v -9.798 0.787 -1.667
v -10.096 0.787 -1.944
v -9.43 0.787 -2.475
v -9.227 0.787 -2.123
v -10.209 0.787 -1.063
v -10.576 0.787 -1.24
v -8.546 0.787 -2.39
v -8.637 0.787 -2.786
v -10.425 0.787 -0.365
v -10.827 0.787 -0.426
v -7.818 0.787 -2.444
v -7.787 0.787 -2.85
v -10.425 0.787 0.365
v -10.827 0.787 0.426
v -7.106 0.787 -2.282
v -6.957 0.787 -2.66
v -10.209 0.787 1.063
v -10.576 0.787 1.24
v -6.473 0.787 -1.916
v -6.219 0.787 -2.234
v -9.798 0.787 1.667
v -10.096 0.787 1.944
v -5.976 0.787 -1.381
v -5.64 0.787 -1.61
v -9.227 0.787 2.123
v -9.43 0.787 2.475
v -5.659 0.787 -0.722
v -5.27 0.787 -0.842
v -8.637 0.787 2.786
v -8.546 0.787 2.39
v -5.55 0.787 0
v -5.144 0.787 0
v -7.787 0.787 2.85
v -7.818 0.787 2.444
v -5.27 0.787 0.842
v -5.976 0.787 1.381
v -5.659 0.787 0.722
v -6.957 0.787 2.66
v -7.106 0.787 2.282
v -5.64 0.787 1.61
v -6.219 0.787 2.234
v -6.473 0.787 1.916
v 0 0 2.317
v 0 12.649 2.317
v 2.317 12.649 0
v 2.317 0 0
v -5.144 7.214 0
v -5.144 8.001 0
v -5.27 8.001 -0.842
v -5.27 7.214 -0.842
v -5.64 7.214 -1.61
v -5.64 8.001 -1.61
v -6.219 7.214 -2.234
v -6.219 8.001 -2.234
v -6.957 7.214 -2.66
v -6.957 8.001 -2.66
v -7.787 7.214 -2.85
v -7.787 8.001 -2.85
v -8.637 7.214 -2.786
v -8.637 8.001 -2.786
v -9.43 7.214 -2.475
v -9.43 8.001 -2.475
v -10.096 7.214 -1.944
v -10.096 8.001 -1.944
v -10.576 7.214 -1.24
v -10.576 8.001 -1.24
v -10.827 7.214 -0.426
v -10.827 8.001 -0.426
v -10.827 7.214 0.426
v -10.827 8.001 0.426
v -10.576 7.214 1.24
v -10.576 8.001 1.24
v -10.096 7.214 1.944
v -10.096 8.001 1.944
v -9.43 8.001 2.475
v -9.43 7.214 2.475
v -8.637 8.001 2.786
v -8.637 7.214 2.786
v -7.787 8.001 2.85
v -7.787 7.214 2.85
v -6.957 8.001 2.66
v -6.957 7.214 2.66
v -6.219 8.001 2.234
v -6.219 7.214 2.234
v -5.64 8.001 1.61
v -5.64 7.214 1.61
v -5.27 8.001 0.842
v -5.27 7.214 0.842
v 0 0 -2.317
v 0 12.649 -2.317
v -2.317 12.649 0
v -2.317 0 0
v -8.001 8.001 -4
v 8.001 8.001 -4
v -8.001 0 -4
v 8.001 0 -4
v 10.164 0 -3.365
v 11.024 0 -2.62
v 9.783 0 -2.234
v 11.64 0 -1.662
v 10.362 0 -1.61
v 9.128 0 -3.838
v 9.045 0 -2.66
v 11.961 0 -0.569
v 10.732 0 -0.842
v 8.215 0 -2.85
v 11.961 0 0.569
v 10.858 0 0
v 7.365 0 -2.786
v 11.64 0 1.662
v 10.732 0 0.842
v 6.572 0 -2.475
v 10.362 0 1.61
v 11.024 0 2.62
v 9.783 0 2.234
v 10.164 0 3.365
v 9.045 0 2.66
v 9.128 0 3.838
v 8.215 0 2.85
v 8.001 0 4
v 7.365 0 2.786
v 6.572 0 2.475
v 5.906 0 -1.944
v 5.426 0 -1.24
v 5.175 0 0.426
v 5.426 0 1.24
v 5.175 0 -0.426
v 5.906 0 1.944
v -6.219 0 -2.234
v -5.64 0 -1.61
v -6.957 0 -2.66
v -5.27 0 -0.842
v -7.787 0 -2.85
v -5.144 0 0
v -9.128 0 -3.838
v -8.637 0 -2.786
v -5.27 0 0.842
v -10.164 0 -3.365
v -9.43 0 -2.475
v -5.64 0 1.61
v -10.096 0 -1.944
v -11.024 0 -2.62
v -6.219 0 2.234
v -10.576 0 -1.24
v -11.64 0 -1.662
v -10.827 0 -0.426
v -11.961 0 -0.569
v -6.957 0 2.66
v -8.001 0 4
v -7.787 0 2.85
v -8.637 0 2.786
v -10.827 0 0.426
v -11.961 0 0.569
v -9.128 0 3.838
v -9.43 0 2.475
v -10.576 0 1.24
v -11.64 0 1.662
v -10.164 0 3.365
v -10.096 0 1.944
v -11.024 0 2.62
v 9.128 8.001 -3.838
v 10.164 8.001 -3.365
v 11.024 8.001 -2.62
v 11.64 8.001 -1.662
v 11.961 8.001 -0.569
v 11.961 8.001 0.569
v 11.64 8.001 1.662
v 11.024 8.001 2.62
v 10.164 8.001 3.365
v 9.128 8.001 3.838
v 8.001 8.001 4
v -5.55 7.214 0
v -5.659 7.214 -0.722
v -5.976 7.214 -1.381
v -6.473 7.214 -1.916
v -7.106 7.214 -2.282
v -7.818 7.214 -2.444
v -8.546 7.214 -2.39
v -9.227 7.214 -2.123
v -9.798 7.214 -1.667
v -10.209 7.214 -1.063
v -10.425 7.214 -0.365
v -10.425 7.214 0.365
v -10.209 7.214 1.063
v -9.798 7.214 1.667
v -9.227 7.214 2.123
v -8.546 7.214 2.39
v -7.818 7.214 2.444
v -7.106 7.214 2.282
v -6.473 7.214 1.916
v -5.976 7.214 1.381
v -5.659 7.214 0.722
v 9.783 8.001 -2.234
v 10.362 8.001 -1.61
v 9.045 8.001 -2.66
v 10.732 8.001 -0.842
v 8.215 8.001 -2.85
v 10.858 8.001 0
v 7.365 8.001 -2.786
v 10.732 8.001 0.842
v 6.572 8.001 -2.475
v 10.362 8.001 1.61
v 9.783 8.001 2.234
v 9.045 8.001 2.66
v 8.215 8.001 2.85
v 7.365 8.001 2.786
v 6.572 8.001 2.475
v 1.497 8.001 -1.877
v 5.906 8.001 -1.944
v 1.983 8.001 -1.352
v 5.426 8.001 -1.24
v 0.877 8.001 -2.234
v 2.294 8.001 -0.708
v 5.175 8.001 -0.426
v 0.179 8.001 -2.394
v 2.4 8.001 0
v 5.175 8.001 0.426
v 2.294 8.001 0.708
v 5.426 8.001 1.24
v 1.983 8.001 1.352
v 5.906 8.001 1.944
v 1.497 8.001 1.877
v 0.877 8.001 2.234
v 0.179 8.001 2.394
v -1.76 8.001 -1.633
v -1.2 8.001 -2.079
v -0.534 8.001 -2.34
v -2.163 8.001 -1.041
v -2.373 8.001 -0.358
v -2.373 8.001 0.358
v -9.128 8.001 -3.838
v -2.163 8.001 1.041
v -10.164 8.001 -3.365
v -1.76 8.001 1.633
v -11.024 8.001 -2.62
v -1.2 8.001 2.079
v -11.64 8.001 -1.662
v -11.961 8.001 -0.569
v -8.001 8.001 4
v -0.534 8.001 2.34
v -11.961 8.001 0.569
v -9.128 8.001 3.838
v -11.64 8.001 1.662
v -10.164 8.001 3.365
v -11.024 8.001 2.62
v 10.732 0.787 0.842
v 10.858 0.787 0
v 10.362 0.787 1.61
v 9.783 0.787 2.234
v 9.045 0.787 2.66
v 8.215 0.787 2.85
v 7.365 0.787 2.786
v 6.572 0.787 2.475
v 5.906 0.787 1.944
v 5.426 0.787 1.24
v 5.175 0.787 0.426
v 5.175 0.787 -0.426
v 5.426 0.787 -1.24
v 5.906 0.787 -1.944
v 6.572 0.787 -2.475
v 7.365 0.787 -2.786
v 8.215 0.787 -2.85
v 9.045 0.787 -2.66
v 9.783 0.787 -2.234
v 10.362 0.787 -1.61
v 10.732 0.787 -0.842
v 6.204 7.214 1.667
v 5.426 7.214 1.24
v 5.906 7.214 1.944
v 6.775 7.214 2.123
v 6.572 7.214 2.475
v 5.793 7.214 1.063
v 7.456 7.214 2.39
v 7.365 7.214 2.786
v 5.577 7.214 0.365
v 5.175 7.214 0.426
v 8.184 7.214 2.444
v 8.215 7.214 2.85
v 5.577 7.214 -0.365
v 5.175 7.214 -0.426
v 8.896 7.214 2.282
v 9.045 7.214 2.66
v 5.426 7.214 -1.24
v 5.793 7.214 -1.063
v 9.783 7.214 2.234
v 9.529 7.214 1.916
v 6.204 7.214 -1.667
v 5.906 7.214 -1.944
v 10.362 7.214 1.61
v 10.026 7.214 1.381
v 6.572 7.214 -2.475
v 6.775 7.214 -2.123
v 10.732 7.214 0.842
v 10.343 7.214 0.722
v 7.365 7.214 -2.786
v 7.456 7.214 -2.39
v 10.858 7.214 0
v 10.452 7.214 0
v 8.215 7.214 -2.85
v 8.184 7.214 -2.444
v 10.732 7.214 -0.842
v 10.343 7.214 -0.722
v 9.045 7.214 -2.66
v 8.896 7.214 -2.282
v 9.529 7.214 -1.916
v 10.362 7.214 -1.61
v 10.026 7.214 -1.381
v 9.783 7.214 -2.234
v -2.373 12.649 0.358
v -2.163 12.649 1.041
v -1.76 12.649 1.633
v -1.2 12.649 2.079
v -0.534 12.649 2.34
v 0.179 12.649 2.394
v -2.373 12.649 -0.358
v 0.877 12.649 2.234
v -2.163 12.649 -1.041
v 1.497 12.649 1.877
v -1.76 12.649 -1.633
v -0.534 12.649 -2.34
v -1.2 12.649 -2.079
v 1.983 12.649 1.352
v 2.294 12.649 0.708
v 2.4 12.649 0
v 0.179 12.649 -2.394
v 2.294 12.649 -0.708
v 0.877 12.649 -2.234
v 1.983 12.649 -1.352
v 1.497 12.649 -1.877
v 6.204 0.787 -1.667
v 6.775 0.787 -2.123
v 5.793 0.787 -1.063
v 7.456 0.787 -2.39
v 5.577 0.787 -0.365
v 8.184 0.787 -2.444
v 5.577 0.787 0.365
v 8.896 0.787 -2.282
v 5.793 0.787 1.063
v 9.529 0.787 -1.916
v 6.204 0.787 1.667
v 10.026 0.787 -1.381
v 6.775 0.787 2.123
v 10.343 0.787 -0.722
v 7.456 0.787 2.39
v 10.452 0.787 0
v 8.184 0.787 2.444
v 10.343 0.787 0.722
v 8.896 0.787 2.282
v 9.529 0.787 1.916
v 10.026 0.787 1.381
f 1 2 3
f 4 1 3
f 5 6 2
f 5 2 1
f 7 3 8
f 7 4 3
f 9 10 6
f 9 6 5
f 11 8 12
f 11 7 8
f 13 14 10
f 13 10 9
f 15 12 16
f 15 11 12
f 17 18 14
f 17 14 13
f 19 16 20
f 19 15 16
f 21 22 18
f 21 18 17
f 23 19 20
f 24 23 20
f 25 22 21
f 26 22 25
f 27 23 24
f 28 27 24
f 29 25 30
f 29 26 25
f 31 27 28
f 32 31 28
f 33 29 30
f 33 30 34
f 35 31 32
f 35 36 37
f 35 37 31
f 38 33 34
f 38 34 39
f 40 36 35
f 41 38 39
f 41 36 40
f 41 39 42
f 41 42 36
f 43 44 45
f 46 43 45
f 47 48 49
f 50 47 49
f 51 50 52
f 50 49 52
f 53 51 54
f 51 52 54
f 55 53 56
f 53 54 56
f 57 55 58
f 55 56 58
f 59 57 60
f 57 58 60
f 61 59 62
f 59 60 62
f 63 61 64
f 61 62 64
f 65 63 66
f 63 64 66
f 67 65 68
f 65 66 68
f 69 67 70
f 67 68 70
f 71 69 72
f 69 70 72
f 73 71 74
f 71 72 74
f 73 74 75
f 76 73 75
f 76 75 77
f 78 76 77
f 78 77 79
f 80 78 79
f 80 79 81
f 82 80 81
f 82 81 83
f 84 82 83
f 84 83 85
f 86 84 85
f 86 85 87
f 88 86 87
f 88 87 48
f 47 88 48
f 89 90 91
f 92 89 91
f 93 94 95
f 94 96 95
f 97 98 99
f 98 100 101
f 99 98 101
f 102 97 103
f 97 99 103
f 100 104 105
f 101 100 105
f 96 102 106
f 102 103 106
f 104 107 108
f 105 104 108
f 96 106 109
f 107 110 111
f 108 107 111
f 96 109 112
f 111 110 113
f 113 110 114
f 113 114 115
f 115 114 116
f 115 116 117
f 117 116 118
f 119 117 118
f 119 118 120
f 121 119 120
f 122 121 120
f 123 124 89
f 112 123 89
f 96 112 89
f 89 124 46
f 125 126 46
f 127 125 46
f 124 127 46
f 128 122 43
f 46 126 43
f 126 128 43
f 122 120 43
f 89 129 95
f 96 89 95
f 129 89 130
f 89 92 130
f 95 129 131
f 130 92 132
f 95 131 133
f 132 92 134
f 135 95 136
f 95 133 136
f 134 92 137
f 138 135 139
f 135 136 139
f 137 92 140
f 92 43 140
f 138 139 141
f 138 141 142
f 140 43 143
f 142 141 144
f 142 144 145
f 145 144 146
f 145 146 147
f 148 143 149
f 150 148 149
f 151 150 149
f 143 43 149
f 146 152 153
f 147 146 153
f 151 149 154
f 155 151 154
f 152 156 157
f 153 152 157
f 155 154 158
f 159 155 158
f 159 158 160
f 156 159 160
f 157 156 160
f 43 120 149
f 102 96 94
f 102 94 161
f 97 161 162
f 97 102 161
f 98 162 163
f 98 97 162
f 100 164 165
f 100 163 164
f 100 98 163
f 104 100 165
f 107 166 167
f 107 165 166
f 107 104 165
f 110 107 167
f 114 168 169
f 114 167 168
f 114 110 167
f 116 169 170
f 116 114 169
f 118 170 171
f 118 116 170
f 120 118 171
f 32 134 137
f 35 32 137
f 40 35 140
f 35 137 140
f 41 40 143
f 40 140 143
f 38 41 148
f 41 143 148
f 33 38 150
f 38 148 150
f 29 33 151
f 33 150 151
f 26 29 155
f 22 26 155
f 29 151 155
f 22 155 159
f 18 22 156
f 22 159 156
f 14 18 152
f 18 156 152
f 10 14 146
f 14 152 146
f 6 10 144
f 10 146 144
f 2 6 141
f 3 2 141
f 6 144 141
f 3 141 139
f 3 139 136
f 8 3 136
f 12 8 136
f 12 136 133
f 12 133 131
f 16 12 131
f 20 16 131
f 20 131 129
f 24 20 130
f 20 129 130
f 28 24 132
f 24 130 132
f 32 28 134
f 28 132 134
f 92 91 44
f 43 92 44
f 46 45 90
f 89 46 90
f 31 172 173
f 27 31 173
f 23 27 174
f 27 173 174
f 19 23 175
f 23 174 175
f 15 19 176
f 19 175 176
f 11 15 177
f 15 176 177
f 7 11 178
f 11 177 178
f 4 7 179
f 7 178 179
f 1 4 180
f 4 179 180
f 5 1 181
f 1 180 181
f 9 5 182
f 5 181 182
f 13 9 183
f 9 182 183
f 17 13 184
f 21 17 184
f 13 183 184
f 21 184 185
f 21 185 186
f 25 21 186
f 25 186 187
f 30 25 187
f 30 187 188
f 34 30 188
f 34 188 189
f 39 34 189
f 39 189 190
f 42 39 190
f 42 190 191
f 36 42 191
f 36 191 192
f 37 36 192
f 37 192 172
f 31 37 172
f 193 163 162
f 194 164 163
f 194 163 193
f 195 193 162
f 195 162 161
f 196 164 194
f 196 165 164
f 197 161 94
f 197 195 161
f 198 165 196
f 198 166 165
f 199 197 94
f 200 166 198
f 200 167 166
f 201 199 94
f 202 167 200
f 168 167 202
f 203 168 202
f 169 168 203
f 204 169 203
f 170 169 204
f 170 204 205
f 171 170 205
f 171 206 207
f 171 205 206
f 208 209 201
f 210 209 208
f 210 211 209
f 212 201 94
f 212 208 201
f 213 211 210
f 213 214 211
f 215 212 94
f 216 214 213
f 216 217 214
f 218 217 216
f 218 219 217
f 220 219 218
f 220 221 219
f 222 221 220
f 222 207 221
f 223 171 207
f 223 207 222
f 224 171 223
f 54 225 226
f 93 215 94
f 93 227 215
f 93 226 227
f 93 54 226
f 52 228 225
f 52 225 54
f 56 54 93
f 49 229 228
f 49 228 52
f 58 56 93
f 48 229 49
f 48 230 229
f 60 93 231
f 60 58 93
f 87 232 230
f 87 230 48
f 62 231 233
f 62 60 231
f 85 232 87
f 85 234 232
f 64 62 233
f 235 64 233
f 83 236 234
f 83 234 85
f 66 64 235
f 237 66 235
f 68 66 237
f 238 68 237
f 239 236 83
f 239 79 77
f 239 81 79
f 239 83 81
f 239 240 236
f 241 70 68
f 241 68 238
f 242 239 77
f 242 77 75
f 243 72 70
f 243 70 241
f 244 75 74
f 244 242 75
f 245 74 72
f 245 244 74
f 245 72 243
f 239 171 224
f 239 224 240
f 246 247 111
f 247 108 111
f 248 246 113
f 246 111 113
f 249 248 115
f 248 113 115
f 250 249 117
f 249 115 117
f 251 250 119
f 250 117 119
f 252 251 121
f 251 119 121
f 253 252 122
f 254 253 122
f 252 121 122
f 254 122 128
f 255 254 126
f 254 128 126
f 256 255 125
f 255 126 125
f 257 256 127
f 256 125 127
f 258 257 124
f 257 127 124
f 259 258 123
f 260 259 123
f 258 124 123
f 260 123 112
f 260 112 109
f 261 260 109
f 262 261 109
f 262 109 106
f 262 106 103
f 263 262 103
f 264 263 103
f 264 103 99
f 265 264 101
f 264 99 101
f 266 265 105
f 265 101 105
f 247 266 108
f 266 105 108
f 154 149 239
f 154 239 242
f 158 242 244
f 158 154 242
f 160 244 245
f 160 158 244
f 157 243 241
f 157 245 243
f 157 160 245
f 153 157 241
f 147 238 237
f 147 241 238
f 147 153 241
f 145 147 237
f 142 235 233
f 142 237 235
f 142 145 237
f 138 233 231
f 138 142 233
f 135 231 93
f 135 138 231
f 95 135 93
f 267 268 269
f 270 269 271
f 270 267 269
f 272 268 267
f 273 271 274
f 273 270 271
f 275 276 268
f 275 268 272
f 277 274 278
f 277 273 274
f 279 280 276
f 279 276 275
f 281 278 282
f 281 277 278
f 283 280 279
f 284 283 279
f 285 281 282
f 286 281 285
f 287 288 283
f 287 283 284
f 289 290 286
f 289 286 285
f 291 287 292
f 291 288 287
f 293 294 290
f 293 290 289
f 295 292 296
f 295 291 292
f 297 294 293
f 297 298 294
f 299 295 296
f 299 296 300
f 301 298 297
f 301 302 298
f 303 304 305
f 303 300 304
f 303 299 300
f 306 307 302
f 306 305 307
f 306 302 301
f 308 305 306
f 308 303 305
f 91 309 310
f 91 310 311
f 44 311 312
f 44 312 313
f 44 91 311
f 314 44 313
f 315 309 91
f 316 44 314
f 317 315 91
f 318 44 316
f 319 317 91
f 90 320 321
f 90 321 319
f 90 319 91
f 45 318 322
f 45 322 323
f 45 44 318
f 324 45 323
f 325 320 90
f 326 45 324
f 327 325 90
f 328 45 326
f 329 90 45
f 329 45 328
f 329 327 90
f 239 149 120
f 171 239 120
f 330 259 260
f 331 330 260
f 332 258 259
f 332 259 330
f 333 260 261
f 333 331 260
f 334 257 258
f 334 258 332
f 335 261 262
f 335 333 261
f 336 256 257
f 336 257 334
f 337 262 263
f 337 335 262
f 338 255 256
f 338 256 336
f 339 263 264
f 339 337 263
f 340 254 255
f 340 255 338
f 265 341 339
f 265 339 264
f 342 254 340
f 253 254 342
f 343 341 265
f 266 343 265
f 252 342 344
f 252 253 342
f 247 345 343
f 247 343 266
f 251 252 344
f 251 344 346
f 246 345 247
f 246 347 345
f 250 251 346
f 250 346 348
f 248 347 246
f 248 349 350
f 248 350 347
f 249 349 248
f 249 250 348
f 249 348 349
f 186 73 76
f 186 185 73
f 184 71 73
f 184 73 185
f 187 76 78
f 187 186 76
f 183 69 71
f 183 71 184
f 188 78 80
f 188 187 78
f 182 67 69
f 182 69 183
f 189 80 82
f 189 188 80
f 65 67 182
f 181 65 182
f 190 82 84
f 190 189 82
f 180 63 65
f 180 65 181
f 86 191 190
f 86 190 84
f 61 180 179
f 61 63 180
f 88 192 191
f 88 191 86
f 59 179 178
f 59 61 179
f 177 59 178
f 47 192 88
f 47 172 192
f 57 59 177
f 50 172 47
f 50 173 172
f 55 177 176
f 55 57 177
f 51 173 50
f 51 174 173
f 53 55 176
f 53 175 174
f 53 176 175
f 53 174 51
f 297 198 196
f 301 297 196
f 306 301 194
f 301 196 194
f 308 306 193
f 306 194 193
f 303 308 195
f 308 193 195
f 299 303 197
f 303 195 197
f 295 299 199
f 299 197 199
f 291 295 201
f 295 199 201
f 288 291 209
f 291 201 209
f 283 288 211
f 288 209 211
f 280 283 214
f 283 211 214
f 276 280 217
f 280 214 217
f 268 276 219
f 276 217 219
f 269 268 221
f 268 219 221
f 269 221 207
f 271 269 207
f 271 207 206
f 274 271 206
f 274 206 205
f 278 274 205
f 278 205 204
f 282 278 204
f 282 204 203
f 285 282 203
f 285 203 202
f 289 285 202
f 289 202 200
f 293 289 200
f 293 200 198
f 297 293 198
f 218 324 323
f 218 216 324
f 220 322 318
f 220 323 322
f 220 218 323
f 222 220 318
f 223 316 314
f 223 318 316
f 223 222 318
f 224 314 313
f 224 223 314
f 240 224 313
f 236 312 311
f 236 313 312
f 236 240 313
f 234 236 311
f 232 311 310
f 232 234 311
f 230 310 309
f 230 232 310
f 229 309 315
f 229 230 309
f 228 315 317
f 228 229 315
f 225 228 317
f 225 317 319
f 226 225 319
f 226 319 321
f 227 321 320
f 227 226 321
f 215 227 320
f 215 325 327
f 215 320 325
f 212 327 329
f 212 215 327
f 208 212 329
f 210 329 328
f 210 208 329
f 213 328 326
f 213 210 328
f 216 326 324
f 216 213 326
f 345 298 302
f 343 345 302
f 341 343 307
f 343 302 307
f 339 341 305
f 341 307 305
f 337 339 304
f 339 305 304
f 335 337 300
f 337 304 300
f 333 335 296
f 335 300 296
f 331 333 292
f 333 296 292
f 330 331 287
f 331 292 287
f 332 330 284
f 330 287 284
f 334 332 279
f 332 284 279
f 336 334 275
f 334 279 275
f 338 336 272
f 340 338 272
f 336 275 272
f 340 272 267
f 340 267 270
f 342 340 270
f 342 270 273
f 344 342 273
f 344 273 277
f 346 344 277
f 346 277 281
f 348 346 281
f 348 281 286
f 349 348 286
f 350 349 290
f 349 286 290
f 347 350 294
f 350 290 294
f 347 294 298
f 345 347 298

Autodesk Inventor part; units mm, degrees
ref_plane "YZ Plane" through (0, 0, 0) normal (1, 0, 0) x (0, 1, 0)
ref_plane "XZ Plane" through (0, 0, 0) normal (0, 1, 0) x (-1, 0, 0)
ref_plane "XY Plane" through (0, 0, 0) normal (0, 0, 1) x (1, 0, 0)
sketch "Sketch1" plane through (0, 0, 0) normal (0, 1, 0) x (-1, 0, 0)
  line L0 (-8.001, 0) -> (8.001, 0) construction
  line L1 (-8.001, -4.0005) -> (8.001, -4.0005)
  line L2 (8.001, 4.0005) -> (-8.001, 4.0005)
  arc A0 (-8.001, 4.0005) -> (-8.001, -4.0005) centre (-8.001, 0) ccw
  arc A1 (8.001, -4.0005) -> (8.001, 4.0005) centre (8.001, 0) ccw
  line L3 (-2.3169, 0) -> (0, 2.3169)
  line L4 (0, 2.3169) -> (2.3169, 0)
  line L5 (2.3169, 0) -> (0, -2.3169)
  line L6 (0, -2.3169) -> (-2.3169, 0)
  line L7 (-2.3169, 0) -> (2.3169, 0) construction
  line L8 (0, 2.3169) -> (0, -2.3169) construction
  point P0 (0, 0)
  dimension "d0" = 8.001
  dimension "d1" = 8.001
  dimension "d2" = 3.2766
  dimension "d3" = 3.2766
extrude "Extrusion1" add sketch "Sketch1" along normal blind 8.001
sketch "Sketch2" plane through (0, 8.001, 0) normal (0, 1, 0) x (1, 0, 0)
  circle A0 centre (-8.001, 0) radius 2.8575
  point P0 (0, 0)
  dimension "d6" = 8.001
  dimension "d7" = 5.715
extrude "Extrusion2" cut sketch "Sketch2" against normal blind 0.7874
sketch "Sketch3" plane through (0, 8.001, 0) normal (0, 1, 0) x (1, 0, 0)
  circle A0 centre (8.001, 0) radius 2.8575
  point P0 (0, 0)
  dimension "d10" = 8.001
  dimension "d11" = 5.715
extrude "Extrusion3" cut sketch "Sketch3" against normal blind 0.7874
sketch "Sketch4" plane through (0, 0, 0) normal (0, -1, 0) x (1, 0, 0)
  circle A0 centre (8.001, 0) radius 2.8575 projected
  circle A1 centre (8.001, 0) radius 2.8575
  point P0 (0, 0)
extrude "Extrusion4" cut sketch "Sketch4" against normal blind 0.7874
sketch "Sketch5" plane through (0, 0, 0) normal (0, -1, 0) x (1, 0, 0)
  circle A0 centre (-8.001, 0) radius 2.8575 projected
  circle A1 centre (-8.001, 0) radius 2.8575
  point P0 (0, 0)
extrude "Extrusion5" cut sketch "Sketch5" against normal blind 0.7874
sketch "Sketch6" plane through (-8.001, 7.2136, 0) normal (0, 1, 0) x (1, 0, 0)
  circle A0 centre (0, 0) radius 2.4511
  point P0 (8.001, 0)
  dimension "d18" = 4.9022
extrude "Extrusion6" cut sketch "Sketch6" against normal through all
sketch "Sketch7" plane through (8.001, 7.2136, 0) normal (0, 1, 0) x (1, 0, 0)
  circle A0 centre (0, 0) radius 2.4511
  point P0 (-8.001, 0)
  dimension "d21" = 4.9022
extrude "Extrusion7" cut sketch "Sketch7" against normal through all
sketch "Sketch8" plane through (0, 8.001, 0) normal (0, 1, 0) x (1, 0, 0)
  circle A0 centre (0, 0) radius 2.4003
  dimension "d24" = 4.8006
extrude "Extrusion8" add sketch "Sketch8" along normal blind 4.6482
sketch "Sketch9" plane through (0, 12.6492, 0) normal (0, 1, 0) x (1, 0, 0)
  line L0 (2.3169, 0) -> (0, 2.3169)
  line L1 (0, 2.3169) -> (-2.3169, 0)
  line L2 (-2.3169, 0) -> (0, -2.3169)
  line L3 (0, -2.3169) -> (2.3169, 0)
  circle A0 centre (0, 0) radius 2.4003 projected
  line L4 (-1.6383, -1.6383) -> (1.6383, 1.6383) construction
  line L5 (1.6383, -1.6383) -> (-1.6383, 1.6383) construction
  dimension "d27" = 3.2766
  dimension "d28" = 3.2766
extrude "Extrusion9" cut sketch "Sketch9" against normal blind 4.6482 contours L3 L2 L1 L0
properties part number "VexLegoCoupler"
